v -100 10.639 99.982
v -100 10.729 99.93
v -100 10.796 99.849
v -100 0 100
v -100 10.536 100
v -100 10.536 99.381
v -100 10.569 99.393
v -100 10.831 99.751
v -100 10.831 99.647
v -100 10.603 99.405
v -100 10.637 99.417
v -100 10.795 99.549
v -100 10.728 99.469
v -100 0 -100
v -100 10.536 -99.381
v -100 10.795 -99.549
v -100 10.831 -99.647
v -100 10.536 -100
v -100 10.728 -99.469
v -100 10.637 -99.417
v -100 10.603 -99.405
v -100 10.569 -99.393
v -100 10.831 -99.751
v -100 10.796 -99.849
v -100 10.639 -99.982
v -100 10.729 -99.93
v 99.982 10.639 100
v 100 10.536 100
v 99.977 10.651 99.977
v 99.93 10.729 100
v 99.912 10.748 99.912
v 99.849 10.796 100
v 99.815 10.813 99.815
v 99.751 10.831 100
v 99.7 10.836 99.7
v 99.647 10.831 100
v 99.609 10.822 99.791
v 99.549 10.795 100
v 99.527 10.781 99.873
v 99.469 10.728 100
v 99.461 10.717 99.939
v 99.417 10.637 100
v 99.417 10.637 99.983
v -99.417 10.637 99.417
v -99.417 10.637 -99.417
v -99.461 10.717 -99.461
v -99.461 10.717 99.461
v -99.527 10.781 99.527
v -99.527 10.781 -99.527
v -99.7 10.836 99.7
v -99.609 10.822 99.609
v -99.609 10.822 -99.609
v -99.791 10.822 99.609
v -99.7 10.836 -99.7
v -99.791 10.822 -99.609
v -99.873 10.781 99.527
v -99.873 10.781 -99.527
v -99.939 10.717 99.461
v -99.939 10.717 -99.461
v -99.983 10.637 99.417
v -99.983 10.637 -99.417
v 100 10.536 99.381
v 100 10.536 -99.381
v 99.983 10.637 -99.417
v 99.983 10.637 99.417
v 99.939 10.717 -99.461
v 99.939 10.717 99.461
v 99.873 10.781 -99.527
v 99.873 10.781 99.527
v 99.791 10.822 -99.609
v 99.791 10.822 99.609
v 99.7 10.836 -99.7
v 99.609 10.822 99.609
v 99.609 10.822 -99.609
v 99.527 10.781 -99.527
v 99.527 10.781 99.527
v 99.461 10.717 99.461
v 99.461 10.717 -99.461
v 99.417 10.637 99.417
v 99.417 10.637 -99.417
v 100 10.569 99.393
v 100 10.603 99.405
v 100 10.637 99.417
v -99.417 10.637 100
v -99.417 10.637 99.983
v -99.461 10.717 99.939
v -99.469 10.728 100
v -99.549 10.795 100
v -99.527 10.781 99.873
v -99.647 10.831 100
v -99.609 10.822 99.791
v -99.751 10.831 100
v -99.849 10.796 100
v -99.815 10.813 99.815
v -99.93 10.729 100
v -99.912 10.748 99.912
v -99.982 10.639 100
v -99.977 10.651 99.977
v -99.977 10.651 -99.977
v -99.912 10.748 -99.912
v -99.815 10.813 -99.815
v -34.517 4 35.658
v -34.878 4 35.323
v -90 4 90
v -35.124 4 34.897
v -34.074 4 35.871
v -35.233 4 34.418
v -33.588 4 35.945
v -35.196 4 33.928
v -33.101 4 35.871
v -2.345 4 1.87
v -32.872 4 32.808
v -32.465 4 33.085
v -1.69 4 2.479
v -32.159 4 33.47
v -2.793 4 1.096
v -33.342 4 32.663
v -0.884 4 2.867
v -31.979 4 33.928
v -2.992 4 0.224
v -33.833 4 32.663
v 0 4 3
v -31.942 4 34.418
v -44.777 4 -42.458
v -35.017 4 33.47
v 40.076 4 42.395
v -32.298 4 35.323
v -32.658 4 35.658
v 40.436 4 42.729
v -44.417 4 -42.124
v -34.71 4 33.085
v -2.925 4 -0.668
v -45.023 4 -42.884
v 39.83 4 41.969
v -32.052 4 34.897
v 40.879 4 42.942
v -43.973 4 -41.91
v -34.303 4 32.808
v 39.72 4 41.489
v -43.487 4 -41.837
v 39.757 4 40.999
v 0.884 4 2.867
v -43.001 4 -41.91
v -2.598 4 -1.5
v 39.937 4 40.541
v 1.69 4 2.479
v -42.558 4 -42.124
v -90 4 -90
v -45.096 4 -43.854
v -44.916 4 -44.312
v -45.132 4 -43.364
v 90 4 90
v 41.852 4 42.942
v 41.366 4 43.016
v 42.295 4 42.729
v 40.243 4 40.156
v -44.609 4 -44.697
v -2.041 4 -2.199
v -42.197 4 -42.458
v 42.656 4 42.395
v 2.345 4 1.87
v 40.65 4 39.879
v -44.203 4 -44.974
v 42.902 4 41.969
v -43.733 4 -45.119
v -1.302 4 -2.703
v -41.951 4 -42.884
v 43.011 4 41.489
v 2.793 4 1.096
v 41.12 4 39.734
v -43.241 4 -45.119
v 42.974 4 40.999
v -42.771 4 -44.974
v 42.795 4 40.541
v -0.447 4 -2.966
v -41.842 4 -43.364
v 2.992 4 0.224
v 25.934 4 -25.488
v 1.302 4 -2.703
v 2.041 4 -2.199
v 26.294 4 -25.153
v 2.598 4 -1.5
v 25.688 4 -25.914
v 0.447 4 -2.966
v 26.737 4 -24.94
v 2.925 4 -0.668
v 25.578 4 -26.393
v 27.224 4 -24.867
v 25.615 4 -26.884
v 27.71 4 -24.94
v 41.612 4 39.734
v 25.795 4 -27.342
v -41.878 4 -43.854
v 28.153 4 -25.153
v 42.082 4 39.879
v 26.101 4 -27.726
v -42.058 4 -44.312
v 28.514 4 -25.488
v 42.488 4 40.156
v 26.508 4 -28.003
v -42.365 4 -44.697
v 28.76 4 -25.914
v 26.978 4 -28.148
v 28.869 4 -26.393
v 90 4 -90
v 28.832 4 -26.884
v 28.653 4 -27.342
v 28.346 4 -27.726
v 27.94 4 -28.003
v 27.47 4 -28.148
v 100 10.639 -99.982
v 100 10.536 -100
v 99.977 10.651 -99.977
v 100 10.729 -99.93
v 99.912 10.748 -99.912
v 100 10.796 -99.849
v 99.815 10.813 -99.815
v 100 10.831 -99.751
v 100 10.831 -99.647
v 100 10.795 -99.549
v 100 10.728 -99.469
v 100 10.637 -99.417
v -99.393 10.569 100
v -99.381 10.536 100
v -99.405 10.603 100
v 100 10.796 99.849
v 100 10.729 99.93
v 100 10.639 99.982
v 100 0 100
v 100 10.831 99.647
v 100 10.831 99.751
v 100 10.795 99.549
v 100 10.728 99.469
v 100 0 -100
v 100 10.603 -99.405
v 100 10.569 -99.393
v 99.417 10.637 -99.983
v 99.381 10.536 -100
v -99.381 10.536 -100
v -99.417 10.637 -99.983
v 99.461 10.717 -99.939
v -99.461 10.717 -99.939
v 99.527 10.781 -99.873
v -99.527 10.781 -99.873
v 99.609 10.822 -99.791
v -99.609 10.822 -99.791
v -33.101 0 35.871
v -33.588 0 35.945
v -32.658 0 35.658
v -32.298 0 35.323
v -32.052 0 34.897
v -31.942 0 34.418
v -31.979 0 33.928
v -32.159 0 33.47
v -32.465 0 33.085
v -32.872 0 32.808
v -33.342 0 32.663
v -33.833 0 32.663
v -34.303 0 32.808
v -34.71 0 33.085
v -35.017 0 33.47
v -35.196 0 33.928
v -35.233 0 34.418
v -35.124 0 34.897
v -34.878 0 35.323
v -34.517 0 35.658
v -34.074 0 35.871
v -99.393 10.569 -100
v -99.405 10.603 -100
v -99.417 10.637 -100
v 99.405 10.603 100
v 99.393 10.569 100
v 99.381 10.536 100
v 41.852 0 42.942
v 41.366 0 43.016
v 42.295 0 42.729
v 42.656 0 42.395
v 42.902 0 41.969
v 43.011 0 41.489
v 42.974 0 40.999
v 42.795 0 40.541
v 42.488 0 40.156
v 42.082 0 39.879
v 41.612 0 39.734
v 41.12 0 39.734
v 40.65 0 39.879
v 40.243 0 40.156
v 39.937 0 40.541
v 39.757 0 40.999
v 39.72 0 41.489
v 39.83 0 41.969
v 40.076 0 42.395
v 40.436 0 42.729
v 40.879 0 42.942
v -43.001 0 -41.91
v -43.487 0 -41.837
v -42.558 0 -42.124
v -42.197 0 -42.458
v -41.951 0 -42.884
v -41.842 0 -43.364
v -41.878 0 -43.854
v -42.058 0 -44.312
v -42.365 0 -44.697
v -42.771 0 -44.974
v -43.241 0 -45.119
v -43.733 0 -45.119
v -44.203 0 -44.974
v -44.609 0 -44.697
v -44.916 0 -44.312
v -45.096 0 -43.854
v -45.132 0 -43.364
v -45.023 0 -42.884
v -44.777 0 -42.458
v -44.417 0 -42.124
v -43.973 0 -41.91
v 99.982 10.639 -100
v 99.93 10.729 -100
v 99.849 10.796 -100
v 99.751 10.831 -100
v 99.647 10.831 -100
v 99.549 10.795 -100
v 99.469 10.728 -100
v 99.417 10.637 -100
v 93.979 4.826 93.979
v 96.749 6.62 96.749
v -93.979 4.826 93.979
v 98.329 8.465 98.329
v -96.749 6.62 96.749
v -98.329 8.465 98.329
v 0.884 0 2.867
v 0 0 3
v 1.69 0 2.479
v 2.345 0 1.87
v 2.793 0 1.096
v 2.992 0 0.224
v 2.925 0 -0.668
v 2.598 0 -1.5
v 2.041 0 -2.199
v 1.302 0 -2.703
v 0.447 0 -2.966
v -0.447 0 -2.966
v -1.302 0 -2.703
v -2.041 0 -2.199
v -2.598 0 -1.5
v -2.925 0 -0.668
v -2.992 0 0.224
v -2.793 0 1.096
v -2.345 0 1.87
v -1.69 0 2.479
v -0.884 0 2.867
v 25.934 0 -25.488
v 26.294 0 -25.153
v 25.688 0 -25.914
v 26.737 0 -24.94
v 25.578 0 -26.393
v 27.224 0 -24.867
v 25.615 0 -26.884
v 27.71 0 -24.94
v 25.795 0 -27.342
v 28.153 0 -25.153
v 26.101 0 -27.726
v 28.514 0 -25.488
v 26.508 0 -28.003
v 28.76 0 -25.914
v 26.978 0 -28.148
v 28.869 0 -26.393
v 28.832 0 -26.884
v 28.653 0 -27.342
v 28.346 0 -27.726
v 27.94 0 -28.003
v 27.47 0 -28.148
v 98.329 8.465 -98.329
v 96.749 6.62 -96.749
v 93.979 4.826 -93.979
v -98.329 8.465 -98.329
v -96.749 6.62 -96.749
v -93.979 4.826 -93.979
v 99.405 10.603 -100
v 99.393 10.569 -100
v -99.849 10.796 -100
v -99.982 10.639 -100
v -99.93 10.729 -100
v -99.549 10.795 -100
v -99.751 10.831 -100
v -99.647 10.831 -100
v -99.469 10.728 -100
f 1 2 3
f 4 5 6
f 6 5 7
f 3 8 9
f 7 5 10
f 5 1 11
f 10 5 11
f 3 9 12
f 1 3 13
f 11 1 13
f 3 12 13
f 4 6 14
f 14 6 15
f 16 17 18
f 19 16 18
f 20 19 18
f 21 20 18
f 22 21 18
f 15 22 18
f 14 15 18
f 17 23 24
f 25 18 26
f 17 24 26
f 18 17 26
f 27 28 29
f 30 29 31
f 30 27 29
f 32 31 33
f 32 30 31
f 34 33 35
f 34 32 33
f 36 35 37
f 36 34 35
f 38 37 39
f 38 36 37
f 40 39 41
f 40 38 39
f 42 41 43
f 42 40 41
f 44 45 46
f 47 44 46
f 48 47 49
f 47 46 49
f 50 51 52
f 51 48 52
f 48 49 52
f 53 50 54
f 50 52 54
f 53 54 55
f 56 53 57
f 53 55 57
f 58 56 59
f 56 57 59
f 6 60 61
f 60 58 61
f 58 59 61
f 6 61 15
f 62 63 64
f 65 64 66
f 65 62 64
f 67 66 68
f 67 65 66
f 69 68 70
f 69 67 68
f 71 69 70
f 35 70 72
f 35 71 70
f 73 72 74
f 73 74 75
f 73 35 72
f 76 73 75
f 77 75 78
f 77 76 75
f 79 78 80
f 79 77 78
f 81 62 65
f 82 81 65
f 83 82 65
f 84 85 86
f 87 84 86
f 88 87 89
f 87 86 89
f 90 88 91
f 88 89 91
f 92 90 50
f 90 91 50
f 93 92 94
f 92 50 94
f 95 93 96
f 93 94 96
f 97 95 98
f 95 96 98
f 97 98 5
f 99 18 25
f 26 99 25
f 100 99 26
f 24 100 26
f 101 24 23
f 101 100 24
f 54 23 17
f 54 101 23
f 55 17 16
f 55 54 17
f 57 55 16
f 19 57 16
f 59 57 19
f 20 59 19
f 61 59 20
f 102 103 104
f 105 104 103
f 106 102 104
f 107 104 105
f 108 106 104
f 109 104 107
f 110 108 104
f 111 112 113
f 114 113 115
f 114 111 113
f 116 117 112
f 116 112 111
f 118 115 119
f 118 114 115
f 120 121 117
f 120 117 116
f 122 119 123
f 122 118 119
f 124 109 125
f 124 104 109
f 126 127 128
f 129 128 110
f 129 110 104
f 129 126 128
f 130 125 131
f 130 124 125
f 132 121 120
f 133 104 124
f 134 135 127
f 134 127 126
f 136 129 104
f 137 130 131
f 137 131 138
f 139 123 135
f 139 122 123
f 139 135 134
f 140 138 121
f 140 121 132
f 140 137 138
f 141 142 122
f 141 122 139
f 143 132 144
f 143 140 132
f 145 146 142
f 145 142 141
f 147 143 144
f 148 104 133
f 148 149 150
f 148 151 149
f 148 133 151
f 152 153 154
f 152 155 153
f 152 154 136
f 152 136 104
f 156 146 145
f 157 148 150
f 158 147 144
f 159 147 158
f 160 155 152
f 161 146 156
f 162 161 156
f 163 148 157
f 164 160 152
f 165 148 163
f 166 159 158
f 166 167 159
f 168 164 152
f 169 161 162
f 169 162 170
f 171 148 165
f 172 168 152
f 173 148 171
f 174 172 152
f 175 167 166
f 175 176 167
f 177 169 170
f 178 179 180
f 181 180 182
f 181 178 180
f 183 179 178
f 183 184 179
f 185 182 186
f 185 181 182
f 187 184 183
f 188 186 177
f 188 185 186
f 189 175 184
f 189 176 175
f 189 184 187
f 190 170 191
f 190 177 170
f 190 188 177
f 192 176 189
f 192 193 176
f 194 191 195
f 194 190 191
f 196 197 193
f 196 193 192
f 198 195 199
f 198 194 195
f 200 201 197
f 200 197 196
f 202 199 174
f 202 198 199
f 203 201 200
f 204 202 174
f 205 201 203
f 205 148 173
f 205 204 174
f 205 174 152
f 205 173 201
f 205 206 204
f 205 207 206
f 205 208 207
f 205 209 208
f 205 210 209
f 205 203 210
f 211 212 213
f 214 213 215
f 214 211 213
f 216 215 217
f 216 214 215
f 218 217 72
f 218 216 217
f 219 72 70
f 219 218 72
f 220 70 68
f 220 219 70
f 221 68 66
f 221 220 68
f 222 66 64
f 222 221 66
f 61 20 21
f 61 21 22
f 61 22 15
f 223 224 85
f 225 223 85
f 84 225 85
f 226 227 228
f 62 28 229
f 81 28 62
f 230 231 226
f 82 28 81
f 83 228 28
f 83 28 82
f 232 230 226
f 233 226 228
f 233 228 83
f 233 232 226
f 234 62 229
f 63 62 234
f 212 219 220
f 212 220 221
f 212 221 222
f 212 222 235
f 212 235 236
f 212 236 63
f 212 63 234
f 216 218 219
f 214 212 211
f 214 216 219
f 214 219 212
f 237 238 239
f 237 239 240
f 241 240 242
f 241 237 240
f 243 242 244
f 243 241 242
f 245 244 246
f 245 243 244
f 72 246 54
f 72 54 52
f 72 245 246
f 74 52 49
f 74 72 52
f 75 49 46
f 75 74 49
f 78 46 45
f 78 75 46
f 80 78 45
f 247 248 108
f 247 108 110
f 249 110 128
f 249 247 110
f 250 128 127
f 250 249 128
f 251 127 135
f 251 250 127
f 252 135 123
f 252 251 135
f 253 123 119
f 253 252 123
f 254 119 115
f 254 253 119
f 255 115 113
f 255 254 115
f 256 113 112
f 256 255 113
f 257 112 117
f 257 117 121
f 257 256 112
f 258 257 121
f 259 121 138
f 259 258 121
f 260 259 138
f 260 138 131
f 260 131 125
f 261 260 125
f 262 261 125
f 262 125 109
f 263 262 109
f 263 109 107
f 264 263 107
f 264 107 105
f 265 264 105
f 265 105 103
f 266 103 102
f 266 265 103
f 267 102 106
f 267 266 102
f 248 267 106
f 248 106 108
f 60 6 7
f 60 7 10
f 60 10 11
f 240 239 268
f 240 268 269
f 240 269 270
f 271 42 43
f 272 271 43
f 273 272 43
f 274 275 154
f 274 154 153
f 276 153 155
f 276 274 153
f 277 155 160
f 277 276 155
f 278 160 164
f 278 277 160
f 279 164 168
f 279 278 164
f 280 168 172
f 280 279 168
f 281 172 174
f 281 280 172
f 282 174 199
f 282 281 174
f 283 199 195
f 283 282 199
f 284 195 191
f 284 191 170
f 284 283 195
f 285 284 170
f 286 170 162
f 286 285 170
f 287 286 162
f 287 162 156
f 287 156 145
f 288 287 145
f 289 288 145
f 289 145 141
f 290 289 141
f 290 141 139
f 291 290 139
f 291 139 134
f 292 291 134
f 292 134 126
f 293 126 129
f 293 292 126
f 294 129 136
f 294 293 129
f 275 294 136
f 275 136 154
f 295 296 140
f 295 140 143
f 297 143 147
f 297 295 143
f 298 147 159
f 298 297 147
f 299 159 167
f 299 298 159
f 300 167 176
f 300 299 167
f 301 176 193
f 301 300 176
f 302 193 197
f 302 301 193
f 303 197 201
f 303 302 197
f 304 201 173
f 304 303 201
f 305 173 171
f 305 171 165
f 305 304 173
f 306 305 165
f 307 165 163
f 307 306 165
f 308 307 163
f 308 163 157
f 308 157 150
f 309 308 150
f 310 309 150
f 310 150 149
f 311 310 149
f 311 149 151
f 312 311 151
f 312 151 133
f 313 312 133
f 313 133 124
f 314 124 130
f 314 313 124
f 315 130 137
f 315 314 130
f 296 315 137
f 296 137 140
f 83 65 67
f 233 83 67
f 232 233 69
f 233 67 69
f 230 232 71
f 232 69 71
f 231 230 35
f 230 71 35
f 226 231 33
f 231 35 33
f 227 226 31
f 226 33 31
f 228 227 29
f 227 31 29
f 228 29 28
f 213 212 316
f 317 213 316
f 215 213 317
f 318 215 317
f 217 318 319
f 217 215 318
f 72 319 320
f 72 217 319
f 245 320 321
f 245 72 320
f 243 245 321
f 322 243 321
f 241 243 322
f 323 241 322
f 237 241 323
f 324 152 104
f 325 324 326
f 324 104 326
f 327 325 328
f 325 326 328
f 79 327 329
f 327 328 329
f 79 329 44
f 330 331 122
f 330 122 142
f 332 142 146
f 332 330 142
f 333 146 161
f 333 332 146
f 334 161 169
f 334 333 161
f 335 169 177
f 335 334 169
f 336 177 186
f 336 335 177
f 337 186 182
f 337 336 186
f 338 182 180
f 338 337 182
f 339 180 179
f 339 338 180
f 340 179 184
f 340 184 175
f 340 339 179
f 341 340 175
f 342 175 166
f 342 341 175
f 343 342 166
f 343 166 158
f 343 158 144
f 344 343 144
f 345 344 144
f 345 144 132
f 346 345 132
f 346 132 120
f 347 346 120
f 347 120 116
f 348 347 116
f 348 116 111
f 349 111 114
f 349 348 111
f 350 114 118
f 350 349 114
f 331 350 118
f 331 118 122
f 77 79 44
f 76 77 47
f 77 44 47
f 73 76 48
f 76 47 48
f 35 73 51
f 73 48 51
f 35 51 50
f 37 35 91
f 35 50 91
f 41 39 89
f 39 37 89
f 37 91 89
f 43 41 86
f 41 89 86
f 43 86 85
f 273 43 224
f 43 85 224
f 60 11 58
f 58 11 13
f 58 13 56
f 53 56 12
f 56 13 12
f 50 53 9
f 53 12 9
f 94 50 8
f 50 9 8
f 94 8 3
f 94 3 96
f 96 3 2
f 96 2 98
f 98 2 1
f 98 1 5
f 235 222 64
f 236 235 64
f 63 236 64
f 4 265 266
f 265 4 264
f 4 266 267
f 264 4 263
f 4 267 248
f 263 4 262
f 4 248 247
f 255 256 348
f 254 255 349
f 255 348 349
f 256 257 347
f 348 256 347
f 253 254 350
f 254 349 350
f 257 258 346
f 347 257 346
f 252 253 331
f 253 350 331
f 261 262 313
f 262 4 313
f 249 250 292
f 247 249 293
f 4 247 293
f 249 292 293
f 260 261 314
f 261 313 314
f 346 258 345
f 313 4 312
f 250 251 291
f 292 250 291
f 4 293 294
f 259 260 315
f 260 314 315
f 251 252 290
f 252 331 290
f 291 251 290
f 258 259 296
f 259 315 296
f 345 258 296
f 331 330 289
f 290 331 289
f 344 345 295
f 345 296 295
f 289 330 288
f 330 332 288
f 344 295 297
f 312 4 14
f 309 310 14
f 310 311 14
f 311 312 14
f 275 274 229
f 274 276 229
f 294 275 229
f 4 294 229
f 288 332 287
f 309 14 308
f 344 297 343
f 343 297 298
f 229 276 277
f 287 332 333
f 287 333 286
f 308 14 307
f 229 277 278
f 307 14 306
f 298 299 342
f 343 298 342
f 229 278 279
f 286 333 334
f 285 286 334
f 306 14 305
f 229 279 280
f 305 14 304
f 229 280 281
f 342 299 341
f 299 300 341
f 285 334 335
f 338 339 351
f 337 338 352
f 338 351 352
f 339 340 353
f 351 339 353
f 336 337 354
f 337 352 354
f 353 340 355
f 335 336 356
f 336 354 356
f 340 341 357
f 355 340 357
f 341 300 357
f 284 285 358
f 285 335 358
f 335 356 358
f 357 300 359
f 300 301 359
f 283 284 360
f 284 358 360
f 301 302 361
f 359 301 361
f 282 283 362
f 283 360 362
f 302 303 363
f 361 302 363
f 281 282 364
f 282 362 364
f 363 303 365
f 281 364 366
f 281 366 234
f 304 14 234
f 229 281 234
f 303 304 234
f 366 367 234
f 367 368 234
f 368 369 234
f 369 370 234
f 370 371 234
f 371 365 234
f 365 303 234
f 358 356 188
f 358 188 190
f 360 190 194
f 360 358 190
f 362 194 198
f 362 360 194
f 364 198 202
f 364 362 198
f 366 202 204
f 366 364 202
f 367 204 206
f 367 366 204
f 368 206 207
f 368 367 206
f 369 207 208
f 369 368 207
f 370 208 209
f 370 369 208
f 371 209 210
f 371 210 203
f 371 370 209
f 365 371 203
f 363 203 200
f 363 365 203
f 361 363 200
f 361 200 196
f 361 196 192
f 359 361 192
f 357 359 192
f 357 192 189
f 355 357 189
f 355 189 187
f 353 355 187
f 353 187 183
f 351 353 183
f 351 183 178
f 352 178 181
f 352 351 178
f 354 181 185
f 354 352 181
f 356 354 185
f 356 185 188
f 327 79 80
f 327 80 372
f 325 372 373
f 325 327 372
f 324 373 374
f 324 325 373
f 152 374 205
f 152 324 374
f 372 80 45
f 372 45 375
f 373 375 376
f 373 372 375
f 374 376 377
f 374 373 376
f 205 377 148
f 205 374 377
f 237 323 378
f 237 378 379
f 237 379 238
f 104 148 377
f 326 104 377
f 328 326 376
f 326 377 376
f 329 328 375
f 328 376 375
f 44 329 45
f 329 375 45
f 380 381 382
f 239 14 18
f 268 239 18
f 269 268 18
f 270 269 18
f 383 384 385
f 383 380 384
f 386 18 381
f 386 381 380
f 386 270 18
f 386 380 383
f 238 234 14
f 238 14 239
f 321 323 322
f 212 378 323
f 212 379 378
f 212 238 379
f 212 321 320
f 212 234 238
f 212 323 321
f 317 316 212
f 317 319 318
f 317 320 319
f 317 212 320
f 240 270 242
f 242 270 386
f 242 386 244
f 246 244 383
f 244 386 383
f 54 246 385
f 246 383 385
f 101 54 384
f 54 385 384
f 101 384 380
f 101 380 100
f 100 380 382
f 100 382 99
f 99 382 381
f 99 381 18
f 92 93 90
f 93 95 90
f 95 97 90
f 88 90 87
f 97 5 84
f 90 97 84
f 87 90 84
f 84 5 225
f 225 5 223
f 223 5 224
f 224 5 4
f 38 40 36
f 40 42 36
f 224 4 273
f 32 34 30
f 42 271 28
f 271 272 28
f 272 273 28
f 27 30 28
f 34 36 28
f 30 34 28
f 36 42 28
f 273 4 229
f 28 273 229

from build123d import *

# Parameters (mm, degrees)
SKETCH_1_W      = 200
SKETCH_1_H      = 200
SKETCH_1_R      = 3
SKETCH_1_R_2    = 1.65
EXTRUDE_1_DEPTH = 4
EXTRUDE_3_DEPTH = 100
EXTRUDE_4_DEPTH = 100


with BuildPart() as part:
    # 草图1 → 凸台-拉伸1 (new body)
    with BuildSketch(Plane(origin=(0, 0, 0), x_dir=(1, 0, 0), z_dir=(0, 1, 0))):
        Rectangle(SKETCH_1_W, SKETCH_1_H)
        with Locations(Location((0, 0, 0), (0, 0, 270))):
            Circle(SKETCH_1_R, mode=Mode.SUBTRACT)
        with Locations(Location((27.223611076, 26.516504294, 0), (0, 0, 270))):
            Circle(SKETCH_1_R_2, mode=Mode.SUBTRACT)
        with Locations(Location((-43.487067043, 43.487067043, 0), (0, 0, 270))):
            Circle(SKETCH_1_R_2, mode=Mode.SUBTRACT)
        with Locations(Location((-33.587572106, -34.294678888, 0), (0, 0, 270))):
            Circle(SKETCH_1_R_2, mode=Mode.SUBTRACT)
        with Locations(Location((41.365746699, -41.365746699, 0), (0, 0, 270))):
            Circle(SKETCH_1_R_2, mode=Mode.SUBTRACT)
    extrude(amount=EXTRUDE_1_DEPTH)

    # 草图3 → 凸台-拉伸3 (add, symmetric)
    with BuildSketch(Plane(origin=(0, 0, 0), x_dir=(0, 0, -1), z_dir=(1, 0, 0))):
        with BuildLine():
            Line((-100, 4), (-90, 4))
            ThreePointArc((-90, 4), (-95.760553163, 5.825892877), (-99.417475728, 10.636794548))
            ThreePointArc((-99.417475728, 10.636794548), (-99.751199211, 10.831497168), (-100, 10.535898385))
            Line((-100, 10.535898385), (-100, 4))
        make_face()
        with BuildLine():
            Line((100, 4), (100, 10.535898385))
            ThreePointArc((100, 10.535898385), (99.751199211, 10.831497168), (99.417475728, 10.636794548))
            ThreePointArc((99.417475728, 10.636794548), (95.760553163, 5.825892877), (90, 4))
            Line((90, 4), (100, 4))
        make_face()
    extrude(amount=EXTRUDE_3_DEPTH, both=True)

    # 草图5 → 凸台-拉伸4 (add, symmetric)
    with BuildSketch(Plane.XY):
        with BuildLine():
            Line((-100, 4), (-90, 4))
            ThreePointArc((-90, 4), (-95.760553163, 5.825892877), (-99.417475728, 10.636794548))
            ThreePointArc((-99.417475728, 10.636794548), (-99.751199211, 10.831497168), (-100, 10.535898385))
            Line((-100, 10.535898385), (-100, 4))
        make_face()
        with BuildLine():
            Line((100, 4), (100, 10.535898385))
            ThreePointArc((100, 10.535898385), (99.751199211, 10.831497168), (99.417475728, 10.636794548))
            ThreePointArc((99.417475728, 10.636794548), (95.760553163, 5.825892877), (90, 4))
            Line((90, 4), (100, 4))
        make_face()
    extrude(amount=EXTRUDE_4_DEPTH, both=True)


solid = part.part
